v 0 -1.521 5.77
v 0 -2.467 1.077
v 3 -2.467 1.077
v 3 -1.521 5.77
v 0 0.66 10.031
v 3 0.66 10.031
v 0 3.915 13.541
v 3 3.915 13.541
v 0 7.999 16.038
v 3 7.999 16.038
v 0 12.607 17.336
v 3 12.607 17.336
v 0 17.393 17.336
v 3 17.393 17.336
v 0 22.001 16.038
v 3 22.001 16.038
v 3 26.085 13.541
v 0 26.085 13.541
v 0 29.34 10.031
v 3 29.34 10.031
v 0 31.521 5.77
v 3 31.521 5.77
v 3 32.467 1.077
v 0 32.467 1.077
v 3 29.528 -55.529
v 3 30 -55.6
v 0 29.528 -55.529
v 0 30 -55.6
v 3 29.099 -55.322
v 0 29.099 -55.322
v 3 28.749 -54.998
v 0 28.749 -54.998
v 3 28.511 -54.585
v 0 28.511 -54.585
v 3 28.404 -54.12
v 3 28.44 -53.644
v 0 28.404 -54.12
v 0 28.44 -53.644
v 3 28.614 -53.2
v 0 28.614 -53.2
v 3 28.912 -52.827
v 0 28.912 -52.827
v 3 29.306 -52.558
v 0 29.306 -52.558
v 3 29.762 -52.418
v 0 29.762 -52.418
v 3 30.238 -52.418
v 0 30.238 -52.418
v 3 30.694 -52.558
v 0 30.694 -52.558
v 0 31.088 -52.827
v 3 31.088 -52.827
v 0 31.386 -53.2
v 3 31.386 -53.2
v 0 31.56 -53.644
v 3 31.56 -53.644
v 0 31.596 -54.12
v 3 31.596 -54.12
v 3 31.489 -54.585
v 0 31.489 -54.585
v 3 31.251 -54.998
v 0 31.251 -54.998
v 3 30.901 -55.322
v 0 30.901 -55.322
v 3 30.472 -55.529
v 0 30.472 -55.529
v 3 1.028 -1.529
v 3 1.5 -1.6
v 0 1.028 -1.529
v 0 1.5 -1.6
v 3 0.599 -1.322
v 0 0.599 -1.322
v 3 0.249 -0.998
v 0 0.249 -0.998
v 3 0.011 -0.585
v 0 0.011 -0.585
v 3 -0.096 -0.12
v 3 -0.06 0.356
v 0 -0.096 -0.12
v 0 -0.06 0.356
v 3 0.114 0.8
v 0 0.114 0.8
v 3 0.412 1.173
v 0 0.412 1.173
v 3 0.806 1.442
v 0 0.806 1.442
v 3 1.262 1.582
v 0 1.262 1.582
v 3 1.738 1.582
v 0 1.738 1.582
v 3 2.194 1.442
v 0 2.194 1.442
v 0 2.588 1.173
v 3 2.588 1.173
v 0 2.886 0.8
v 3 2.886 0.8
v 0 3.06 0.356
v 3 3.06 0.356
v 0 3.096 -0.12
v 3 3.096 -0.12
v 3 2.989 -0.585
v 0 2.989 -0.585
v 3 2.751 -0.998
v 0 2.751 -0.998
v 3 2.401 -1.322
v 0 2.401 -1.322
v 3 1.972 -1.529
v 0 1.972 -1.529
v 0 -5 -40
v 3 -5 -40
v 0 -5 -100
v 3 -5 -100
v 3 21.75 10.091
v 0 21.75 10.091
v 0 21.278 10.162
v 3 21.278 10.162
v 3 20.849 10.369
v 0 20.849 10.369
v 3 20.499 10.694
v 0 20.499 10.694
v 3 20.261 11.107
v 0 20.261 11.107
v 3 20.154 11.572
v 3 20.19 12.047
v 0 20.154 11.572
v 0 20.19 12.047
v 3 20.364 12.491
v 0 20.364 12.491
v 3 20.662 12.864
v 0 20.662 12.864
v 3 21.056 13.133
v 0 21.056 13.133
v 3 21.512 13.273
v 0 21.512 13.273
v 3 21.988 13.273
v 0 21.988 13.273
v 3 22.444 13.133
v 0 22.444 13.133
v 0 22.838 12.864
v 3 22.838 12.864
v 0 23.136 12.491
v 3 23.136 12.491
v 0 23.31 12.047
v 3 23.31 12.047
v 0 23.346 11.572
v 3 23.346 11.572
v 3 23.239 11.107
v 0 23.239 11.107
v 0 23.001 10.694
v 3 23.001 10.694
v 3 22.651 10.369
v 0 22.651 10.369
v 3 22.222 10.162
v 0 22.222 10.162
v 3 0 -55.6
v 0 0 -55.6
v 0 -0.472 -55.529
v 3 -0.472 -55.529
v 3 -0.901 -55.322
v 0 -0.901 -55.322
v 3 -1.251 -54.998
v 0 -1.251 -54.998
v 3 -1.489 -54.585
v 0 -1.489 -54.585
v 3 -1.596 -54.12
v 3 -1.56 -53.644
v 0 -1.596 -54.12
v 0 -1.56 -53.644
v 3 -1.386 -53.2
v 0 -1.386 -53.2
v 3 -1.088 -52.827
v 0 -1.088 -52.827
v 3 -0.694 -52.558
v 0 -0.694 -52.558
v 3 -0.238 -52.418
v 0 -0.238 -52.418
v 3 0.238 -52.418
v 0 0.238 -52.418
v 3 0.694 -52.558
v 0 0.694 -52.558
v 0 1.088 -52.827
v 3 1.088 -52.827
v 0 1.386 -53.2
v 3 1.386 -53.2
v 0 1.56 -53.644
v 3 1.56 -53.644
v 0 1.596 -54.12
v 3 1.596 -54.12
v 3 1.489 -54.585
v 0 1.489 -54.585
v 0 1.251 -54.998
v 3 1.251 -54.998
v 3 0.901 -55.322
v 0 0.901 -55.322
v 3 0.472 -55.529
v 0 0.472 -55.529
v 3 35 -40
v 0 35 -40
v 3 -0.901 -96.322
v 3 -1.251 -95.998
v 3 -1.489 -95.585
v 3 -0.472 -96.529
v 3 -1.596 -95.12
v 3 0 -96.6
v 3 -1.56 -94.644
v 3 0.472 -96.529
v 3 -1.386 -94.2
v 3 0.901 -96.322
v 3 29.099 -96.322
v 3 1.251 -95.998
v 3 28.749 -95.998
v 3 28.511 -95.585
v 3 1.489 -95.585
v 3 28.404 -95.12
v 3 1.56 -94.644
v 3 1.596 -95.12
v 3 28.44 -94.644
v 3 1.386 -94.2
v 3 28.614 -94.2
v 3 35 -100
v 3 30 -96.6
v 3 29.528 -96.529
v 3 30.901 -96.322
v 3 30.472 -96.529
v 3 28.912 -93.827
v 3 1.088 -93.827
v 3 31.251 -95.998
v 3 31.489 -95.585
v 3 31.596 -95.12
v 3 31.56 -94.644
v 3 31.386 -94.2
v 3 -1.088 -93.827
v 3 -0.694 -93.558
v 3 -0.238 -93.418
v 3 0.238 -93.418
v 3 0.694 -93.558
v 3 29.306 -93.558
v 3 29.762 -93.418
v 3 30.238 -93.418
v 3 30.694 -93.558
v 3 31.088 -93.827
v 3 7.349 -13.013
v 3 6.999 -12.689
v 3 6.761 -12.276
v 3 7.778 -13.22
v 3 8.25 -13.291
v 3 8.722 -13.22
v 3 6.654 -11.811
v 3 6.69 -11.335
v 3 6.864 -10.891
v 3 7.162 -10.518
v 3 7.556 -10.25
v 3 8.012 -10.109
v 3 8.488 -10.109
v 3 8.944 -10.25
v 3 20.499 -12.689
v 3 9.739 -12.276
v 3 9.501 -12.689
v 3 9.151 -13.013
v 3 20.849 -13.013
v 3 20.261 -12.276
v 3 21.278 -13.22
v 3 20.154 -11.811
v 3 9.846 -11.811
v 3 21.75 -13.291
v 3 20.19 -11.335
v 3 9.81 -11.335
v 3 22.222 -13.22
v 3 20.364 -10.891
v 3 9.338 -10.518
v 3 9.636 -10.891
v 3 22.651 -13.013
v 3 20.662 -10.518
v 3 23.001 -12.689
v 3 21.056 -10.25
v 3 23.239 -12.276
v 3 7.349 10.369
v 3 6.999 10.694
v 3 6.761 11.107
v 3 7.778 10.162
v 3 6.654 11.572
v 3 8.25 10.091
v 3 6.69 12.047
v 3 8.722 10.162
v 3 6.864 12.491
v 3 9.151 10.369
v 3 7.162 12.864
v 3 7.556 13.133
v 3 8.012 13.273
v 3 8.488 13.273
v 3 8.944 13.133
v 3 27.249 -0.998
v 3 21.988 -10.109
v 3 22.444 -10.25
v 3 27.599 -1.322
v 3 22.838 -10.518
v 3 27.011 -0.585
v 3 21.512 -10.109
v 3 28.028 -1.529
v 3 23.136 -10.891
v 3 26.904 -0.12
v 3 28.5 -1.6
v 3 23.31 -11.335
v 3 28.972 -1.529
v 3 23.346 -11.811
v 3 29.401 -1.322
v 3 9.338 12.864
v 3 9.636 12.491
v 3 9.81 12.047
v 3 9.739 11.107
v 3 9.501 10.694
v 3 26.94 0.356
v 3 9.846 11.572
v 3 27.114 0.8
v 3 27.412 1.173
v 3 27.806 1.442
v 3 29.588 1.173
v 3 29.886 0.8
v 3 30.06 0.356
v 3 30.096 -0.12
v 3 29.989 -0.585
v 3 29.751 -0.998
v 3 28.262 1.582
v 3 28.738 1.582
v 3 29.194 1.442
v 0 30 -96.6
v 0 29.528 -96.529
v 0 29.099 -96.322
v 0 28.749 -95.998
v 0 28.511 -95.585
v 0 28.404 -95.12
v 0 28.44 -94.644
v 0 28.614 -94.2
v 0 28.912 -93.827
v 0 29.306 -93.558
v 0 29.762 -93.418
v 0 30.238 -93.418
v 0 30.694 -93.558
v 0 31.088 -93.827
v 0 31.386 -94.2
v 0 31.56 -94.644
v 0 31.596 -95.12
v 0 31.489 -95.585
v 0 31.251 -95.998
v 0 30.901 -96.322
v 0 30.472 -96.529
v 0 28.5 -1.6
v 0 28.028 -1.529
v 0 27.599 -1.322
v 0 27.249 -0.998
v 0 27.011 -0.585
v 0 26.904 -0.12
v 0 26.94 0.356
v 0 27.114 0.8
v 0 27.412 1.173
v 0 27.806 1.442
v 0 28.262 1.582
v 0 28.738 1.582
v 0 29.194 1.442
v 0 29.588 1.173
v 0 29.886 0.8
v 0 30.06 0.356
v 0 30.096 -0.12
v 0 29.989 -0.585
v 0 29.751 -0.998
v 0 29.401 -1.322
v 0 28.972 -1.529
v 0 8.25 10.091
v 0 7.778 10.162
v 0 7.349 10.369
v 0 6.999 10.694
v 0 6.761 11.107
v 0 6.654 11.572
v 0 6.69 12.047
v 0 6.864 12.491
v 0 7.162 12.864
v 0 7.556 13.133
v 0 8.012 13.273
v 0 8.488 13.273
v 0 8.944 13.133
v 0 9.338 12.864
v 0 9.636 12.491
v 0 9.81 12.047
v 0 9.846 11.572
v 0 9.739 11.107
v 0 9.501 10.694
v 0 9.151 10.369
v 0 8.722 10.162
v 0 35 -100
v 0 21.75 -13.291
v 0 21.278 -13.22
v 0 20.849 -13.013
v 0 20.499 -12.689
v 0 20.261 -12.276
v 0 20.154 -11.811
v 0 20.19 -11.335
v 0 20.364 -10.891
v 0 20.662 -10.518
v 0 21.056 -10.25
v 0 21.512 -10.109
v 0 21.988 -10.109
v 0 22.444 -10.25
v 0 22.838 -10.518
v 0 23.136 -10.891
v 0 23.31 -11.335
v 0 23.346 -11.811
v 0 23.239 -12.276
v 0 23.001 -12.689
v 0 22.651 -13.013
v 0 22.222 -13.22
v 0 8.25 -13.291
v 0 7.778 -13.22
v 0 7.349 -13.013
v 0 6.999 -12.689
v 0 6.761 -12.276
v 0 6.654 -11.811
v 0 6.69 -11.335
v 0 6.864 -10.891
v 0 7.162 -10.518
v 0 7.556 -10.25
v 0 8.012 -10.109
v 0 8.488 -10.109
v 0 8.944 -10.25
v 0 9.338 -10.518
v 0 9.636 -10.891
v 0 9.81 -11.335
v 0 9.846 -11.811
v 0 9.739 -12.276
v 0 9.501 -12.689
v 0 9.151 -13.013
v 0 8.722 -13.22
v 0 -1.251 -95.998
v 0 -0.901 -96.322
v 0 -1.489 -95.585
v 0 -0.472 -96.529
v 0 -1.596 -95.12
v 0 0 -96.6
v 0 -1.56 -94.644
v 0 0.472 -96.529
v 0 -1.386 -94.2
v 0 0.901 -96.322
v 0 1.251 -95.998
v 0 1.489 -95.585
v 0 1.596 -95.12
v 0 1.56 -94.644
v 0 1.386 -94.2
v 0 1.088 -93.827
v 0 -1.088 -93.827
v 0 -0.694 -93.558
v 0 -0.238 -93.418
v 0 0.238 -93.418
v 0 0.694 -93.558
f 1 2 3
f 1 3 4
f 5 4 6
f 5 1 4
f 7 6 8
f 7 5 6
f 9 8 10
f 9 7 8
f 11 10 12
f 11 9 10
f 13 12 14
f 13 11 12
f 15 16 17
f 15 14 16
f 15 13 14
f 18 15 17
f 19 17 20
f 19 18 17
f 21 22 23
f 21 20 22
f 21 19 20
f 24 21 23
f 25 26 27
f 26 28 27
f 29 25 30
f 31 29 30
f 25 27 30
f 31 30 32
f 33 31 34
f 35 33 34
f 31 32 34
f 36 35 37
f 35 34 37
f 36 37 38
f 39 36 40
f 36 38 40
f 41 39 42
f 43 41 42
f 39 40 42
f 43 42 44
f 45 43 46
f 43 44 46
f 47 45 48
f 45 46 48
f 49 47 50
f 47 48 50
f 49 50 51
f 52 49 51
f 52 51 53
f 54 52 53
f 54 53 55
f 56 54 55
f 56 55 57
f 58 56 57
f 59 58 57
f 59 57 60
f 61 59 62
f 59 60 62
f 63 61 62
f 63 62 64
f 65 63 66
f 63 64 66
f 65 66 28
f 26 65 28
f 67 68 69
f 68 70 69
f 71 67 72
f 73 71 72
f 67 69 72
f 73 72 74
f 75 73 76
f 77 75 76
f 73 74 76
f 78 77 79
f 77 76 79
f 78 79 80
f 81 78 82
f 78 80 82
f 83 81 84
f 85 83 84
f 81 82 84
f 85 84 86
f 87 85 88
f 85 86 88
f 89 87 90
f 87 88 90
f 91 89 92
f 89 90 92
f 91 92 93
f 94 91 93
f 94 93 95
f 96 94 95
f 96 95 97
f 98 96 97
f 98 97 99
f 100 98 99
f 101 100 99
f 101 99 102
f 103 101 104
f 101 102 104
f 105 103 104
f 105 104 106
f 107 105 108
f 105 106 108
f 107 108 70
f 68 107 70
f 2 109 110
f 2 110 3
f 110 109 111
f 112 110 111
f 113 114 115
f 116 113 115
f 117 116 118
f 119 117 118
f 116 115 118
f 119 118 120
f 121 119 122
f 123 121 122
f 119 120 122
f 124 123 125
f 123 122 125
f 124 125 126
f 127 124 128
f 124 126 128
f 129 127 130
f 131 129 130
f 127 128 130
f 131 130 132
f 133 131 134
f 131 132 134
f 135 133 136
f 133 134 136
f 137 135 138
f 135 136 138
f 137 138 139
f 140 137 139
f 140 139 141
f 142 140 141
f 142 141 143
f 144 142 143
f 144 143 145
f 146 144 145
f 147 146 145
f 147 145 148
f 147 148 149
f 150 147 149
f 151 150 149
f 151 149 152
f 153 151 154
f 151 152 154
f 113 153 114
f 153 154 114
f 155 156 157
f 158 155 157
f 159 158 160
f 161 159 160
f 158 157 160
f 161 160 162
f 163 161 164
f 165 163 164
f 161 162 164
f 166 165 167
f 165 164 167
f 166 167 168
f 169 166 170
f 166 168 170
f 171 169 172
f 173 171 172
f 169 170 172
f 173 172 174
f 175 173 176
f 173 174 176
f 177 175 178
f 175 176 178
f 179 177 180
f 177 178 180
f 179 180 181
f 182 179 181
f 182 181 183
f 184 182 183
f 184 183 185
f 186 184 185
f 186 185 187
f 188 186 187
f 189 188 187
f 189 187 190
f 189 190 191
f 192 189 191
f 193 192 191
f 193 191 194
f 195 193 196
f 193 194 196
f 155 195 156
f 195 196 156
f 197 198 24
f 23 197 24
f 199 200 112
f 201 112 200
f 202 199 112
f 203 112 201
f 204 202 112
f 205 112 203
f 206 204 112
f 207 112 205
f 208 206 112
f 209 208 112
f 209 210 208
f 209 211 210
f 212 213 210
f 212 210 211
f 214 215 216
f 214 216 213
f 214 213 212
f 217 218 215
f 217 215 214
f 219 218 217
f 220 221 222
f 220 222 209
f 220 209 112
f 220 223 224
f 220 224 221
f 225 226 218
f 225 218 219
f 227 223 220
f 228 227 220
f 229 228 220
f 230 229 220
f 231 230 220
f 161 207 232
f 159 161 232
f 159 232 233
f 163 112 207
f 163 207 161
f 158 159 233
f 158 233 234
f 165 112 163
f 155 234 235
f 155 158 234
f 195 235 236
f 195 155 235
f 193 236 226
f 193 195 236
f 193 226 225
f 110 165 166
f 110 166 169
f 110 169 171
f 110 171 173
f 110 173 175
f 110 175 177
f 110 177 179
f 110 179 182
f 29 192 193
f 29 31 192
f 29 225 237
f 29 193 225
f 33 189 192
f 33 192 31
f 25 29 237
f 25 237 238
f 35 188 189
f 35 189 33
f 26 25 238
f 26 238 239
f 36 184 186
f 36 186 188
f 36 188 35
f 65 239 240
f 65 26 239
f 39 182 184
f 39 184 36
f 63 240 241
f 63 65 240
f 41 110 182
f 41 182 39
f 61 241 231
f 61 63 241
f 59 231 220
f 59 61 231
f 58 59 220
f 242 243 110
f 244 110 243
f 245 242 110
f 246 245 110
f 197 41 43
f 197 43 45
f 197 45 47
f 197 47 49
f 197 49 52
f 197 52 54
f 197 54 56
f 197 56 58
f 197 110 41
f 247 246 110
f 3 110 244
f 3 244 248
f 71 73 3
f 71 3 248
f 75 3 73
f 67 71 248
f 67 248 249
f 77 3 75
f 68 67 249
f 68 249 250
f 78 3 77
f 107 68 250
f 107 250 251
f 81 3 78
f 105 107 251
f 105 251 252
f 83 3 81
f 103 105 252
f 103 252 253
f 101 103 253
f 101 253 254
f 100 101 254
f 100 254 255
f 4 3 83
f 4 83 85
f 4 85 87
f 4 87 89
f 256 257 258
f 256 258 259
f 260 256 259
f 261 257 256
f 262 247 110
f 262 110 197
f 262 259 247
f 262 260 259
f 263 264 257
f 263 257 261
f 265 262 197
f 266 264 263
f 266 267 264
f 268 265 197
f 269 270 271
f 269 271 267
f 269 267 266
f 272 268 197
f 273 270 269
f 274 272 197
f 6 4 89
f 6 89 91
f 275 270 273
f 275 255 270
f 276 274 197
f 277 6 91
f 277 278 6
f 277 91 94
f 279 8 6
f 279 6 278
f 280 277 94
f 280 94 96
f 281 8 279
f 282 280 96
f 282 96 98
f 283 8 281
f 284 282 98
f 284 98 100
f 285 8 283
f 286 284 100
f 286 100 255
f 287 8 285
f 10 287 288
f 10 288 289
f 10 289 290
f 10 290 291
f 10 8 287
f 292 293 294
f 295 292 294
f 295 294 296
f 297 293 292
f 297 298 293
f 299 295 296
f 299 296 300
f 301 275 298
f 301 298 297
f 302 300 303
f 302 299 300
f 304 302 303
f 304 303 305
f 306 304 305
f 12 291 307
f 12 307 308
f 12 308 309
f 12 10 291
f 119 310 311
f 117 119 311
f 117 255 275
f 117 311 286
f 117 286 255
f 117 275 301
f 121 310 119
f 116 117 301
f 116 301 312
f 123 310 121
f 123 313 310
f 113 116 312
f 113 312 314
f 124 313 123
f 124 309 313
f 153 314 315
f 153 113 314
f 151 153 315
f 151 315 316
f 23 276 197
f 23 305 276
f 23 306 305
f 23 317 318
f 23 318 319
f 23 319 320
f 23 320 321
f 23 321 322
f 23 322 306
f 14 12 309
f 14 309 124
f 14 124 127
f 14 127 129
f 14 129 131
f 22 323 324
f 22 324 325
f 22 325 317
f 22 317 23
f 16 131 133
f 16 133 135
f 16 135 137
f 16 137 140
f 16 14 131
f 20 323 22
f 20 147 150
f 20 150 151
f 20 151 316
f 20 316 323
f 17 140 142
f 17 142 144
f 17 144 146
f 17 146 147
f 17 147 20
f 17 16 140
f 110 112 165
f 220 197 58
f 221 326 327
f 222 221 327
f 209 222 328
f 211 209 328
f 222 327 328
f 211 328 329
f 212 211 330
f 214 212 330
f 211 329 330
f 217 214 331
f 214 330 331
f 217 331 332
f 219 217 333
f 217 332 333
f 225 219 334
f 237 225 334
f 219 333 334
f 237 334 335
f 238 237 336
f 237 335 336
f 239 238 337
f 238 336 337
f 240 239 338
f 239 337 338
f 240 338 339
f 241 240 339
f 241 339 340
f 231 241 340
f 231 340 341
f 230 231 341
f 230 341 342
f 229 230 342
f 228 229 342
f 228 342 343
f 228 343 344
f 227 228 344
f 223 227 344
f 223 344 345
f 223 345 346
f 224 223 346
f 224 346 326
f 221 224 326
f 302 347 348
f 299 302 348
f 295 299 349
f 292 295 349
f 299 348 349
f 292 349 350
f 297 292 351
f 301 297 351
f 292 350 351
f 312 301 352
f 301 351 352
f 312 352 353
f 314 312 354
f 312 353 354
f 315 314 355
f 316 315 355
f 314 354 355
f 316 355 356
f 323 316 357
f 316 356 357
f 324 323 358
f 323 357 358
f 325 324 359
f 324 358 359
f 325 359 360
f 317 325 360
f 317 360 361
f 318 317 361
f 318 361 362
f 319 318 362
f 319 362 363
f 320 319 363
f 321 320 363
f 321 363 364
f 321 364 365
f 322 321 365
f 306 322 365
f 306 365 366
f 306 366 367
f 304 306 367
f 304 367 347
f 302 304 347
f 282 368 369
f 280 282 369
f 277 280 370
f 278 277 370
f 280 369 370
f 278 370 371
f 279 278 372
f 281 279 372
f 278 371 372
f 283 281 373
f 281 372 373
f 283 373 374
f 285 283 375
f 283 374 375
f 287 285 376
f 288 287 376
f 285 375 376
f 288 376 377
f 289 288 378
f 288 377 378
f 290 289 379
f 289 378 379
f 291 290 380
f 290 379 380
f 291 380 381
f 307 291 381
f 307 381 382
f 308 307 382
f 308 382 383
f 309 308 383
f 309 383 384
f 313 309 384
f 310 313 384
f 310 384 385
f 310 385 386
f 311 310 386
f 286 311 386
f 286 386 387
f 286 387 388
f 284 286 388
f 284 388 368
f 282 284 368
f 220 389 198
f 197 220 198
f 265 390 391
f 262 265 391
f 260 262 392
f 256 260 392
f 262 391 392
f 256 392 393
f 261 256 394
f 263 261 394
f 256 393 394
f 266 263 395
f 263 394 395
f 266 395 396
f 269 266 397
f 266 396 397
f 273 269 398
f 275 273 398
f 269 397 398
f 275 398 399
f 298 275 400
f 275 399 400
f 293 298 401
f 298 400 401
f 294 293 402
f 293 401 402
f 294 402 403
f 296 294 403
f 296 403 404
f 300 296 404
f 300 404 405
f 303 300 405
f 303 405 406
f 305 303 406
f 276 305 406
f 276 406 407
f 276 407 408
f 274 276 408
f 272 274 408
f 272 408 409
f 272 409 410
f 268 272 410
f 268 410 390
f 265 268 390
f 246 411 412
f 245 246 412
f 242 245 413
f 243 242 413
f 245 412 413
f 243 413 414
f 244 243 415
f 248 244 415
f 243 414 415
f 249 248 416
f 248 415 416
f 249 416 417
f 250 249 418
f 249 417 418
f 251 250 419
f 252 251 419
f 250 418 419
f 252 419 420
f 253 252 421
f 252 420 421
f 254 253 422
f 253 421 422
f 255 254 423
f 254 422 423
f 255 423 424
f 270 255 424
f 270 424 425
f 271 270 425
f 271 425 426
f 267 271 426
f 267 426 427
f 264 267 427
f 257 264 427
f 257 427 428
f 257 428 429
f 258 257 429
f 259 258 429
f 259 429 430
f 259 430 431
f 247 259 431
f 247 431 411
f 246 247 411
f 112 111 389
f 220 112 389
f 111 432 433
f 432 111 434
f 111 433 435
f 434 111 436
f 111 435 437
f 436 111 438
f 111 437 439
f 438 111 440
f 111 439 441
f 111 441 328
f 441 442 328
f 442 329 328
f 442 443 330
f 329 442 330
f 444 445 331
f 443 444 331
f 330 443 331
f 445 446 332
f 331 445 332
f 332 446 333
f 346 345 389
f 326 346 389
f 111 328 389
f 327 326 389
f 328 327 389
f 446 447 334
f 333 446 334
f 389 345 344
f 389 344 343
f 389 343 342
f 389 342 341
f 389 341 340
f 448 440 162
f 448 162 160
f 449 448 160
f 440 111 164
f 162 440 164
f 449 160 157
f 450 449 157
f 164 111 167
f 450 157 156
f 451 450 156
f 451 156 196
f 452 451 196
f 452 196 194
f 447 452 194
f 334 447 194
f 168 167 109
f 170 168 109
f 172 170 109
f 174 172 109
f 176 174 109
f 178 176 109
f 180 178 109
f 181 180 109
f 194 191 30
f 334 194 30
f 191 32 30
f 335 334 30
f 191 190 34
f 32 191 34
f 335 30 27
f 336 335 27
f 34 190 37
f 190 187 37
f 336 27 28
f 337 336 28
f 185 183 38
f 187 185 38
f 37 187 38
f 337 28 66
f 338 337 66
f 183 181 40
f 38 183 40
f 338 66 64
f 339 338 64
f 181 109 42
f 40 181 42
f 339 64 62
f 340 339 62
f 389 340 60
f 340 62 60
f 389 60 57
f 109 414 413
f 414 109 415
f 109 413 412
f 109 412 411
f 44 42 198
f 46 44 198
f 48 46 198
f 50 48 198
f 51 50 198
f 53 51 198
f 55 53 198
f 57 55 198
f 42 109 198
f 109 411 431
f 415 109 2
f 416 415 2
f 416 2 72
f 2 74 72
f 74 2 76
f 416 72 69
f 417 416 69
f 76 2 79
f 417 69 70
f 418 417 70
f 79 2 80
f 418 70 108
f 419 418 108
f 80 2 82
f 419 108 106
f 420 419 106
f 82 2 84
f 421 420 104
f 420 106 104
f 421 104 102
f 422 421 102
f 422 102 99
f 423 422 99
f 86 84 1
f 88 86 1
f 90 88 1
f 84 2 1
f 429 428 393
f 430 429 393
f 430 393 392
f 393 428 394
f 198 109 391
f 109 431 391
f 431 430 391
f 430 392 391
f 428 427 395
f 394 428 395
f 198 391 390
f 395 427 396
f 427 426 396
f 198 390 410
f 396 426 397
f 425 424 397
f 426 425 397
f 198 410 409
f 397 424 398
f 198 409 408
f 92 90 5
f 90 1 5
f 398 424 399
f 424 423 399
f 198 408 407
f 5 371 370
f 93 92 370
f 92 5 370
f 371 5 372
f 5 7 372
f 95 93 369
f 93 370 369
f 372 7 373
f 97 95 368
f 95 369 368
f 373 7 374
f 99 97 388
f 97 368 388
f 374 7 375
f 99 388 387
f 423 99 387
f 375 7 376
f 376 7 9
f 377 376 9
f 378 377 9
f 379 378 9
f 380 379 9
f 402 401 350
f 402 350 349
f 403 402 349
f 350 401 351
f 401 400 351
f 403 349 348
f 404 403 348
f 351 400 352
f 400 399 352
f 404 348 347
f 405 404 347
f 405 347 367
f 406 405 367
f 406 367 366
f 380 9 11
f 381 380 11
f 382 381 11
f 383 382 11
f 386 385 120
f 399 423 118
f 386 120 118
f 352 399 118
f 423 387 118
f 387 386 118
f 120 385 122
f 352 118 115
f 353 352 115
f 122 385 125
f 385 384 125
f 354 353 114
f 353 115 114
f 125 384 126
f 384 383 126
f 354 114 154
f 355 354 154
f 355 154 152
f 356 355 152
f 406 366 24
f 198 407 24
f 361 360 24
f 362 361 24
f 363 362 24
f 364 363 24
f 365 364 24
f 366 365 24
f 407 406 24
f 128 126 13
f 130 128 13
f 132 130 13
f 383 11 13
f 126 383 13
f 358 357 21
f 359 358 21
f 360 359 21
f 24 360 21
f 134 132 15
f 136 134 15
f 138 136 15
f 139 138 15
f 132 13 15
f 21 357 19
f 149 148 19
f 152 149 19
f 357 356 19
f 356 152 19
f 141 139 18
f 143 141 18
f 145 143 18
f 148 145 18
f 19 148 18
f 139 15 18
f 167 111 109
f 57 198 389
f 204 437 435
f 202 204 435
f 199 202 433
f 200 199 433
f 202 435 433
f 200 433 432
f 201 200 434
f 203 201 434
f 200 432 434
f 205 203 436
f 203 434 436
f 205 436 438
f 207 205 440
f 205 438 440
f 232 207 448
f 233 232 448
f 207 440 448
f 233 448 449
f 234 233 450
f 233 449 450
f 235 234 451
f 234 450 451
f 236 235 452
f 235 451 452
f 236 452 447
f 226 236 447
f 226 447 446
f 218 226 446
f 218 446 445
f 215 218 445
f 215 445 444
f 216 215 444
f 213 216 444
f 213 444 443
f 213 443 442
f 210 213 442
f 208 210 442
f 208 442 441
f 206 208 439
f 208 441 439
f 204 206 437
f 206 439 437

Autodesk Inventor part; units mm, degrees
ref_plane "YZ Plane" through (0, 0, 0) normal (1, 0, 0) x (0, 1, 0)
ref_plane "XZ Plane" through (0, 0, 0) normal (0, 1, 0) x (-1, 0, 0)
ref_plane "XY Plane" through (0, 0, 0) normal (0, 0, 1) x (1, 0, 0)
sketch "スケッチ1" plane through (0, 0, 0) normal (1, 0, 0) x (0, 1, 0)
  line L0 (35, -40) -> (-5, -40)
  line L1 (-5, -40) -> (-5, -100)
  line L2 (-5, -100) -> (35, -100)
  line L3 (35, -100) -> (35, -40)
  circle A0 centre (15, 0) radius 17.5
  line L4 (35, -40) -> (32.4668, 1.0772)
  line L5 (-5, -40) -> (-2.4668, 1.0772)
  dimension "d1" = 40
  dimension "d2" = 60
  dimension "d54" = 35
  dimension "d55" = 20
extrude "押し出し1" add sketch "スケッチ1" along normal blind 3
sketch "スケッチ4" plane through (3, 0, 0) normal (1, 0, 0) x (0, 0, -1)
  line L0 (54, 30) -> (95, 30)
  line L1 (95, 30) -> (95, 0)
  line L2 (95, 0) -> (54, 0)
  line L3 (54, 0) -> (54, 30)
  line L4 (100, 35) -> (40, 35) projected
  line L5 (100, -5) -> (100, 35) projected
  point P0 (0, 0)
  dimension "d29" = 41
  dimension "d30" = 30
  dimension "d31" = 5
  dimension "d32" = 5
hole "穴2" at (3, 30, -54) at (3, 0, -54) at (3, 0, -95) at (3, 30, -95) direction (-1, 0, 0) diameter 3.2 end through all
sketch "スケッチ6" plane through (3, 0, 0) normal (1, 0, 0) x (0, 0, -1)
  arc A0 (-1.0772, 32.4668) -> (-1.0772, -2.4668) centre (0, 15) ccw projected
  circle A1 centre (0, 15) radius 13.5
  point P0 (0, 0)
  point P1 (0, 1.5)
  point P2 (11.6913, 8.25)
  point P3 (11.6913, 21.75)
  point P4 (0, 28.5)
  point P5 (-11.6913, 21.75)
  point P6 (-11.6913, 8.25)
  dimension "d56" = 27
  dimension "d59" = 360
hole "穴4" at (3, 1.5, 0) at (3, 8.25, -11.6913) at (3, 21.75, -11.6913) at (3, 28.5, 0) at (3, 21.75, 11.6913) at (3, 8.25, 11.6913) direction (-1, 0, 0) diameter 3.2 end through all
properties part number "link6_plate1" material "アルミニウム 6061"
